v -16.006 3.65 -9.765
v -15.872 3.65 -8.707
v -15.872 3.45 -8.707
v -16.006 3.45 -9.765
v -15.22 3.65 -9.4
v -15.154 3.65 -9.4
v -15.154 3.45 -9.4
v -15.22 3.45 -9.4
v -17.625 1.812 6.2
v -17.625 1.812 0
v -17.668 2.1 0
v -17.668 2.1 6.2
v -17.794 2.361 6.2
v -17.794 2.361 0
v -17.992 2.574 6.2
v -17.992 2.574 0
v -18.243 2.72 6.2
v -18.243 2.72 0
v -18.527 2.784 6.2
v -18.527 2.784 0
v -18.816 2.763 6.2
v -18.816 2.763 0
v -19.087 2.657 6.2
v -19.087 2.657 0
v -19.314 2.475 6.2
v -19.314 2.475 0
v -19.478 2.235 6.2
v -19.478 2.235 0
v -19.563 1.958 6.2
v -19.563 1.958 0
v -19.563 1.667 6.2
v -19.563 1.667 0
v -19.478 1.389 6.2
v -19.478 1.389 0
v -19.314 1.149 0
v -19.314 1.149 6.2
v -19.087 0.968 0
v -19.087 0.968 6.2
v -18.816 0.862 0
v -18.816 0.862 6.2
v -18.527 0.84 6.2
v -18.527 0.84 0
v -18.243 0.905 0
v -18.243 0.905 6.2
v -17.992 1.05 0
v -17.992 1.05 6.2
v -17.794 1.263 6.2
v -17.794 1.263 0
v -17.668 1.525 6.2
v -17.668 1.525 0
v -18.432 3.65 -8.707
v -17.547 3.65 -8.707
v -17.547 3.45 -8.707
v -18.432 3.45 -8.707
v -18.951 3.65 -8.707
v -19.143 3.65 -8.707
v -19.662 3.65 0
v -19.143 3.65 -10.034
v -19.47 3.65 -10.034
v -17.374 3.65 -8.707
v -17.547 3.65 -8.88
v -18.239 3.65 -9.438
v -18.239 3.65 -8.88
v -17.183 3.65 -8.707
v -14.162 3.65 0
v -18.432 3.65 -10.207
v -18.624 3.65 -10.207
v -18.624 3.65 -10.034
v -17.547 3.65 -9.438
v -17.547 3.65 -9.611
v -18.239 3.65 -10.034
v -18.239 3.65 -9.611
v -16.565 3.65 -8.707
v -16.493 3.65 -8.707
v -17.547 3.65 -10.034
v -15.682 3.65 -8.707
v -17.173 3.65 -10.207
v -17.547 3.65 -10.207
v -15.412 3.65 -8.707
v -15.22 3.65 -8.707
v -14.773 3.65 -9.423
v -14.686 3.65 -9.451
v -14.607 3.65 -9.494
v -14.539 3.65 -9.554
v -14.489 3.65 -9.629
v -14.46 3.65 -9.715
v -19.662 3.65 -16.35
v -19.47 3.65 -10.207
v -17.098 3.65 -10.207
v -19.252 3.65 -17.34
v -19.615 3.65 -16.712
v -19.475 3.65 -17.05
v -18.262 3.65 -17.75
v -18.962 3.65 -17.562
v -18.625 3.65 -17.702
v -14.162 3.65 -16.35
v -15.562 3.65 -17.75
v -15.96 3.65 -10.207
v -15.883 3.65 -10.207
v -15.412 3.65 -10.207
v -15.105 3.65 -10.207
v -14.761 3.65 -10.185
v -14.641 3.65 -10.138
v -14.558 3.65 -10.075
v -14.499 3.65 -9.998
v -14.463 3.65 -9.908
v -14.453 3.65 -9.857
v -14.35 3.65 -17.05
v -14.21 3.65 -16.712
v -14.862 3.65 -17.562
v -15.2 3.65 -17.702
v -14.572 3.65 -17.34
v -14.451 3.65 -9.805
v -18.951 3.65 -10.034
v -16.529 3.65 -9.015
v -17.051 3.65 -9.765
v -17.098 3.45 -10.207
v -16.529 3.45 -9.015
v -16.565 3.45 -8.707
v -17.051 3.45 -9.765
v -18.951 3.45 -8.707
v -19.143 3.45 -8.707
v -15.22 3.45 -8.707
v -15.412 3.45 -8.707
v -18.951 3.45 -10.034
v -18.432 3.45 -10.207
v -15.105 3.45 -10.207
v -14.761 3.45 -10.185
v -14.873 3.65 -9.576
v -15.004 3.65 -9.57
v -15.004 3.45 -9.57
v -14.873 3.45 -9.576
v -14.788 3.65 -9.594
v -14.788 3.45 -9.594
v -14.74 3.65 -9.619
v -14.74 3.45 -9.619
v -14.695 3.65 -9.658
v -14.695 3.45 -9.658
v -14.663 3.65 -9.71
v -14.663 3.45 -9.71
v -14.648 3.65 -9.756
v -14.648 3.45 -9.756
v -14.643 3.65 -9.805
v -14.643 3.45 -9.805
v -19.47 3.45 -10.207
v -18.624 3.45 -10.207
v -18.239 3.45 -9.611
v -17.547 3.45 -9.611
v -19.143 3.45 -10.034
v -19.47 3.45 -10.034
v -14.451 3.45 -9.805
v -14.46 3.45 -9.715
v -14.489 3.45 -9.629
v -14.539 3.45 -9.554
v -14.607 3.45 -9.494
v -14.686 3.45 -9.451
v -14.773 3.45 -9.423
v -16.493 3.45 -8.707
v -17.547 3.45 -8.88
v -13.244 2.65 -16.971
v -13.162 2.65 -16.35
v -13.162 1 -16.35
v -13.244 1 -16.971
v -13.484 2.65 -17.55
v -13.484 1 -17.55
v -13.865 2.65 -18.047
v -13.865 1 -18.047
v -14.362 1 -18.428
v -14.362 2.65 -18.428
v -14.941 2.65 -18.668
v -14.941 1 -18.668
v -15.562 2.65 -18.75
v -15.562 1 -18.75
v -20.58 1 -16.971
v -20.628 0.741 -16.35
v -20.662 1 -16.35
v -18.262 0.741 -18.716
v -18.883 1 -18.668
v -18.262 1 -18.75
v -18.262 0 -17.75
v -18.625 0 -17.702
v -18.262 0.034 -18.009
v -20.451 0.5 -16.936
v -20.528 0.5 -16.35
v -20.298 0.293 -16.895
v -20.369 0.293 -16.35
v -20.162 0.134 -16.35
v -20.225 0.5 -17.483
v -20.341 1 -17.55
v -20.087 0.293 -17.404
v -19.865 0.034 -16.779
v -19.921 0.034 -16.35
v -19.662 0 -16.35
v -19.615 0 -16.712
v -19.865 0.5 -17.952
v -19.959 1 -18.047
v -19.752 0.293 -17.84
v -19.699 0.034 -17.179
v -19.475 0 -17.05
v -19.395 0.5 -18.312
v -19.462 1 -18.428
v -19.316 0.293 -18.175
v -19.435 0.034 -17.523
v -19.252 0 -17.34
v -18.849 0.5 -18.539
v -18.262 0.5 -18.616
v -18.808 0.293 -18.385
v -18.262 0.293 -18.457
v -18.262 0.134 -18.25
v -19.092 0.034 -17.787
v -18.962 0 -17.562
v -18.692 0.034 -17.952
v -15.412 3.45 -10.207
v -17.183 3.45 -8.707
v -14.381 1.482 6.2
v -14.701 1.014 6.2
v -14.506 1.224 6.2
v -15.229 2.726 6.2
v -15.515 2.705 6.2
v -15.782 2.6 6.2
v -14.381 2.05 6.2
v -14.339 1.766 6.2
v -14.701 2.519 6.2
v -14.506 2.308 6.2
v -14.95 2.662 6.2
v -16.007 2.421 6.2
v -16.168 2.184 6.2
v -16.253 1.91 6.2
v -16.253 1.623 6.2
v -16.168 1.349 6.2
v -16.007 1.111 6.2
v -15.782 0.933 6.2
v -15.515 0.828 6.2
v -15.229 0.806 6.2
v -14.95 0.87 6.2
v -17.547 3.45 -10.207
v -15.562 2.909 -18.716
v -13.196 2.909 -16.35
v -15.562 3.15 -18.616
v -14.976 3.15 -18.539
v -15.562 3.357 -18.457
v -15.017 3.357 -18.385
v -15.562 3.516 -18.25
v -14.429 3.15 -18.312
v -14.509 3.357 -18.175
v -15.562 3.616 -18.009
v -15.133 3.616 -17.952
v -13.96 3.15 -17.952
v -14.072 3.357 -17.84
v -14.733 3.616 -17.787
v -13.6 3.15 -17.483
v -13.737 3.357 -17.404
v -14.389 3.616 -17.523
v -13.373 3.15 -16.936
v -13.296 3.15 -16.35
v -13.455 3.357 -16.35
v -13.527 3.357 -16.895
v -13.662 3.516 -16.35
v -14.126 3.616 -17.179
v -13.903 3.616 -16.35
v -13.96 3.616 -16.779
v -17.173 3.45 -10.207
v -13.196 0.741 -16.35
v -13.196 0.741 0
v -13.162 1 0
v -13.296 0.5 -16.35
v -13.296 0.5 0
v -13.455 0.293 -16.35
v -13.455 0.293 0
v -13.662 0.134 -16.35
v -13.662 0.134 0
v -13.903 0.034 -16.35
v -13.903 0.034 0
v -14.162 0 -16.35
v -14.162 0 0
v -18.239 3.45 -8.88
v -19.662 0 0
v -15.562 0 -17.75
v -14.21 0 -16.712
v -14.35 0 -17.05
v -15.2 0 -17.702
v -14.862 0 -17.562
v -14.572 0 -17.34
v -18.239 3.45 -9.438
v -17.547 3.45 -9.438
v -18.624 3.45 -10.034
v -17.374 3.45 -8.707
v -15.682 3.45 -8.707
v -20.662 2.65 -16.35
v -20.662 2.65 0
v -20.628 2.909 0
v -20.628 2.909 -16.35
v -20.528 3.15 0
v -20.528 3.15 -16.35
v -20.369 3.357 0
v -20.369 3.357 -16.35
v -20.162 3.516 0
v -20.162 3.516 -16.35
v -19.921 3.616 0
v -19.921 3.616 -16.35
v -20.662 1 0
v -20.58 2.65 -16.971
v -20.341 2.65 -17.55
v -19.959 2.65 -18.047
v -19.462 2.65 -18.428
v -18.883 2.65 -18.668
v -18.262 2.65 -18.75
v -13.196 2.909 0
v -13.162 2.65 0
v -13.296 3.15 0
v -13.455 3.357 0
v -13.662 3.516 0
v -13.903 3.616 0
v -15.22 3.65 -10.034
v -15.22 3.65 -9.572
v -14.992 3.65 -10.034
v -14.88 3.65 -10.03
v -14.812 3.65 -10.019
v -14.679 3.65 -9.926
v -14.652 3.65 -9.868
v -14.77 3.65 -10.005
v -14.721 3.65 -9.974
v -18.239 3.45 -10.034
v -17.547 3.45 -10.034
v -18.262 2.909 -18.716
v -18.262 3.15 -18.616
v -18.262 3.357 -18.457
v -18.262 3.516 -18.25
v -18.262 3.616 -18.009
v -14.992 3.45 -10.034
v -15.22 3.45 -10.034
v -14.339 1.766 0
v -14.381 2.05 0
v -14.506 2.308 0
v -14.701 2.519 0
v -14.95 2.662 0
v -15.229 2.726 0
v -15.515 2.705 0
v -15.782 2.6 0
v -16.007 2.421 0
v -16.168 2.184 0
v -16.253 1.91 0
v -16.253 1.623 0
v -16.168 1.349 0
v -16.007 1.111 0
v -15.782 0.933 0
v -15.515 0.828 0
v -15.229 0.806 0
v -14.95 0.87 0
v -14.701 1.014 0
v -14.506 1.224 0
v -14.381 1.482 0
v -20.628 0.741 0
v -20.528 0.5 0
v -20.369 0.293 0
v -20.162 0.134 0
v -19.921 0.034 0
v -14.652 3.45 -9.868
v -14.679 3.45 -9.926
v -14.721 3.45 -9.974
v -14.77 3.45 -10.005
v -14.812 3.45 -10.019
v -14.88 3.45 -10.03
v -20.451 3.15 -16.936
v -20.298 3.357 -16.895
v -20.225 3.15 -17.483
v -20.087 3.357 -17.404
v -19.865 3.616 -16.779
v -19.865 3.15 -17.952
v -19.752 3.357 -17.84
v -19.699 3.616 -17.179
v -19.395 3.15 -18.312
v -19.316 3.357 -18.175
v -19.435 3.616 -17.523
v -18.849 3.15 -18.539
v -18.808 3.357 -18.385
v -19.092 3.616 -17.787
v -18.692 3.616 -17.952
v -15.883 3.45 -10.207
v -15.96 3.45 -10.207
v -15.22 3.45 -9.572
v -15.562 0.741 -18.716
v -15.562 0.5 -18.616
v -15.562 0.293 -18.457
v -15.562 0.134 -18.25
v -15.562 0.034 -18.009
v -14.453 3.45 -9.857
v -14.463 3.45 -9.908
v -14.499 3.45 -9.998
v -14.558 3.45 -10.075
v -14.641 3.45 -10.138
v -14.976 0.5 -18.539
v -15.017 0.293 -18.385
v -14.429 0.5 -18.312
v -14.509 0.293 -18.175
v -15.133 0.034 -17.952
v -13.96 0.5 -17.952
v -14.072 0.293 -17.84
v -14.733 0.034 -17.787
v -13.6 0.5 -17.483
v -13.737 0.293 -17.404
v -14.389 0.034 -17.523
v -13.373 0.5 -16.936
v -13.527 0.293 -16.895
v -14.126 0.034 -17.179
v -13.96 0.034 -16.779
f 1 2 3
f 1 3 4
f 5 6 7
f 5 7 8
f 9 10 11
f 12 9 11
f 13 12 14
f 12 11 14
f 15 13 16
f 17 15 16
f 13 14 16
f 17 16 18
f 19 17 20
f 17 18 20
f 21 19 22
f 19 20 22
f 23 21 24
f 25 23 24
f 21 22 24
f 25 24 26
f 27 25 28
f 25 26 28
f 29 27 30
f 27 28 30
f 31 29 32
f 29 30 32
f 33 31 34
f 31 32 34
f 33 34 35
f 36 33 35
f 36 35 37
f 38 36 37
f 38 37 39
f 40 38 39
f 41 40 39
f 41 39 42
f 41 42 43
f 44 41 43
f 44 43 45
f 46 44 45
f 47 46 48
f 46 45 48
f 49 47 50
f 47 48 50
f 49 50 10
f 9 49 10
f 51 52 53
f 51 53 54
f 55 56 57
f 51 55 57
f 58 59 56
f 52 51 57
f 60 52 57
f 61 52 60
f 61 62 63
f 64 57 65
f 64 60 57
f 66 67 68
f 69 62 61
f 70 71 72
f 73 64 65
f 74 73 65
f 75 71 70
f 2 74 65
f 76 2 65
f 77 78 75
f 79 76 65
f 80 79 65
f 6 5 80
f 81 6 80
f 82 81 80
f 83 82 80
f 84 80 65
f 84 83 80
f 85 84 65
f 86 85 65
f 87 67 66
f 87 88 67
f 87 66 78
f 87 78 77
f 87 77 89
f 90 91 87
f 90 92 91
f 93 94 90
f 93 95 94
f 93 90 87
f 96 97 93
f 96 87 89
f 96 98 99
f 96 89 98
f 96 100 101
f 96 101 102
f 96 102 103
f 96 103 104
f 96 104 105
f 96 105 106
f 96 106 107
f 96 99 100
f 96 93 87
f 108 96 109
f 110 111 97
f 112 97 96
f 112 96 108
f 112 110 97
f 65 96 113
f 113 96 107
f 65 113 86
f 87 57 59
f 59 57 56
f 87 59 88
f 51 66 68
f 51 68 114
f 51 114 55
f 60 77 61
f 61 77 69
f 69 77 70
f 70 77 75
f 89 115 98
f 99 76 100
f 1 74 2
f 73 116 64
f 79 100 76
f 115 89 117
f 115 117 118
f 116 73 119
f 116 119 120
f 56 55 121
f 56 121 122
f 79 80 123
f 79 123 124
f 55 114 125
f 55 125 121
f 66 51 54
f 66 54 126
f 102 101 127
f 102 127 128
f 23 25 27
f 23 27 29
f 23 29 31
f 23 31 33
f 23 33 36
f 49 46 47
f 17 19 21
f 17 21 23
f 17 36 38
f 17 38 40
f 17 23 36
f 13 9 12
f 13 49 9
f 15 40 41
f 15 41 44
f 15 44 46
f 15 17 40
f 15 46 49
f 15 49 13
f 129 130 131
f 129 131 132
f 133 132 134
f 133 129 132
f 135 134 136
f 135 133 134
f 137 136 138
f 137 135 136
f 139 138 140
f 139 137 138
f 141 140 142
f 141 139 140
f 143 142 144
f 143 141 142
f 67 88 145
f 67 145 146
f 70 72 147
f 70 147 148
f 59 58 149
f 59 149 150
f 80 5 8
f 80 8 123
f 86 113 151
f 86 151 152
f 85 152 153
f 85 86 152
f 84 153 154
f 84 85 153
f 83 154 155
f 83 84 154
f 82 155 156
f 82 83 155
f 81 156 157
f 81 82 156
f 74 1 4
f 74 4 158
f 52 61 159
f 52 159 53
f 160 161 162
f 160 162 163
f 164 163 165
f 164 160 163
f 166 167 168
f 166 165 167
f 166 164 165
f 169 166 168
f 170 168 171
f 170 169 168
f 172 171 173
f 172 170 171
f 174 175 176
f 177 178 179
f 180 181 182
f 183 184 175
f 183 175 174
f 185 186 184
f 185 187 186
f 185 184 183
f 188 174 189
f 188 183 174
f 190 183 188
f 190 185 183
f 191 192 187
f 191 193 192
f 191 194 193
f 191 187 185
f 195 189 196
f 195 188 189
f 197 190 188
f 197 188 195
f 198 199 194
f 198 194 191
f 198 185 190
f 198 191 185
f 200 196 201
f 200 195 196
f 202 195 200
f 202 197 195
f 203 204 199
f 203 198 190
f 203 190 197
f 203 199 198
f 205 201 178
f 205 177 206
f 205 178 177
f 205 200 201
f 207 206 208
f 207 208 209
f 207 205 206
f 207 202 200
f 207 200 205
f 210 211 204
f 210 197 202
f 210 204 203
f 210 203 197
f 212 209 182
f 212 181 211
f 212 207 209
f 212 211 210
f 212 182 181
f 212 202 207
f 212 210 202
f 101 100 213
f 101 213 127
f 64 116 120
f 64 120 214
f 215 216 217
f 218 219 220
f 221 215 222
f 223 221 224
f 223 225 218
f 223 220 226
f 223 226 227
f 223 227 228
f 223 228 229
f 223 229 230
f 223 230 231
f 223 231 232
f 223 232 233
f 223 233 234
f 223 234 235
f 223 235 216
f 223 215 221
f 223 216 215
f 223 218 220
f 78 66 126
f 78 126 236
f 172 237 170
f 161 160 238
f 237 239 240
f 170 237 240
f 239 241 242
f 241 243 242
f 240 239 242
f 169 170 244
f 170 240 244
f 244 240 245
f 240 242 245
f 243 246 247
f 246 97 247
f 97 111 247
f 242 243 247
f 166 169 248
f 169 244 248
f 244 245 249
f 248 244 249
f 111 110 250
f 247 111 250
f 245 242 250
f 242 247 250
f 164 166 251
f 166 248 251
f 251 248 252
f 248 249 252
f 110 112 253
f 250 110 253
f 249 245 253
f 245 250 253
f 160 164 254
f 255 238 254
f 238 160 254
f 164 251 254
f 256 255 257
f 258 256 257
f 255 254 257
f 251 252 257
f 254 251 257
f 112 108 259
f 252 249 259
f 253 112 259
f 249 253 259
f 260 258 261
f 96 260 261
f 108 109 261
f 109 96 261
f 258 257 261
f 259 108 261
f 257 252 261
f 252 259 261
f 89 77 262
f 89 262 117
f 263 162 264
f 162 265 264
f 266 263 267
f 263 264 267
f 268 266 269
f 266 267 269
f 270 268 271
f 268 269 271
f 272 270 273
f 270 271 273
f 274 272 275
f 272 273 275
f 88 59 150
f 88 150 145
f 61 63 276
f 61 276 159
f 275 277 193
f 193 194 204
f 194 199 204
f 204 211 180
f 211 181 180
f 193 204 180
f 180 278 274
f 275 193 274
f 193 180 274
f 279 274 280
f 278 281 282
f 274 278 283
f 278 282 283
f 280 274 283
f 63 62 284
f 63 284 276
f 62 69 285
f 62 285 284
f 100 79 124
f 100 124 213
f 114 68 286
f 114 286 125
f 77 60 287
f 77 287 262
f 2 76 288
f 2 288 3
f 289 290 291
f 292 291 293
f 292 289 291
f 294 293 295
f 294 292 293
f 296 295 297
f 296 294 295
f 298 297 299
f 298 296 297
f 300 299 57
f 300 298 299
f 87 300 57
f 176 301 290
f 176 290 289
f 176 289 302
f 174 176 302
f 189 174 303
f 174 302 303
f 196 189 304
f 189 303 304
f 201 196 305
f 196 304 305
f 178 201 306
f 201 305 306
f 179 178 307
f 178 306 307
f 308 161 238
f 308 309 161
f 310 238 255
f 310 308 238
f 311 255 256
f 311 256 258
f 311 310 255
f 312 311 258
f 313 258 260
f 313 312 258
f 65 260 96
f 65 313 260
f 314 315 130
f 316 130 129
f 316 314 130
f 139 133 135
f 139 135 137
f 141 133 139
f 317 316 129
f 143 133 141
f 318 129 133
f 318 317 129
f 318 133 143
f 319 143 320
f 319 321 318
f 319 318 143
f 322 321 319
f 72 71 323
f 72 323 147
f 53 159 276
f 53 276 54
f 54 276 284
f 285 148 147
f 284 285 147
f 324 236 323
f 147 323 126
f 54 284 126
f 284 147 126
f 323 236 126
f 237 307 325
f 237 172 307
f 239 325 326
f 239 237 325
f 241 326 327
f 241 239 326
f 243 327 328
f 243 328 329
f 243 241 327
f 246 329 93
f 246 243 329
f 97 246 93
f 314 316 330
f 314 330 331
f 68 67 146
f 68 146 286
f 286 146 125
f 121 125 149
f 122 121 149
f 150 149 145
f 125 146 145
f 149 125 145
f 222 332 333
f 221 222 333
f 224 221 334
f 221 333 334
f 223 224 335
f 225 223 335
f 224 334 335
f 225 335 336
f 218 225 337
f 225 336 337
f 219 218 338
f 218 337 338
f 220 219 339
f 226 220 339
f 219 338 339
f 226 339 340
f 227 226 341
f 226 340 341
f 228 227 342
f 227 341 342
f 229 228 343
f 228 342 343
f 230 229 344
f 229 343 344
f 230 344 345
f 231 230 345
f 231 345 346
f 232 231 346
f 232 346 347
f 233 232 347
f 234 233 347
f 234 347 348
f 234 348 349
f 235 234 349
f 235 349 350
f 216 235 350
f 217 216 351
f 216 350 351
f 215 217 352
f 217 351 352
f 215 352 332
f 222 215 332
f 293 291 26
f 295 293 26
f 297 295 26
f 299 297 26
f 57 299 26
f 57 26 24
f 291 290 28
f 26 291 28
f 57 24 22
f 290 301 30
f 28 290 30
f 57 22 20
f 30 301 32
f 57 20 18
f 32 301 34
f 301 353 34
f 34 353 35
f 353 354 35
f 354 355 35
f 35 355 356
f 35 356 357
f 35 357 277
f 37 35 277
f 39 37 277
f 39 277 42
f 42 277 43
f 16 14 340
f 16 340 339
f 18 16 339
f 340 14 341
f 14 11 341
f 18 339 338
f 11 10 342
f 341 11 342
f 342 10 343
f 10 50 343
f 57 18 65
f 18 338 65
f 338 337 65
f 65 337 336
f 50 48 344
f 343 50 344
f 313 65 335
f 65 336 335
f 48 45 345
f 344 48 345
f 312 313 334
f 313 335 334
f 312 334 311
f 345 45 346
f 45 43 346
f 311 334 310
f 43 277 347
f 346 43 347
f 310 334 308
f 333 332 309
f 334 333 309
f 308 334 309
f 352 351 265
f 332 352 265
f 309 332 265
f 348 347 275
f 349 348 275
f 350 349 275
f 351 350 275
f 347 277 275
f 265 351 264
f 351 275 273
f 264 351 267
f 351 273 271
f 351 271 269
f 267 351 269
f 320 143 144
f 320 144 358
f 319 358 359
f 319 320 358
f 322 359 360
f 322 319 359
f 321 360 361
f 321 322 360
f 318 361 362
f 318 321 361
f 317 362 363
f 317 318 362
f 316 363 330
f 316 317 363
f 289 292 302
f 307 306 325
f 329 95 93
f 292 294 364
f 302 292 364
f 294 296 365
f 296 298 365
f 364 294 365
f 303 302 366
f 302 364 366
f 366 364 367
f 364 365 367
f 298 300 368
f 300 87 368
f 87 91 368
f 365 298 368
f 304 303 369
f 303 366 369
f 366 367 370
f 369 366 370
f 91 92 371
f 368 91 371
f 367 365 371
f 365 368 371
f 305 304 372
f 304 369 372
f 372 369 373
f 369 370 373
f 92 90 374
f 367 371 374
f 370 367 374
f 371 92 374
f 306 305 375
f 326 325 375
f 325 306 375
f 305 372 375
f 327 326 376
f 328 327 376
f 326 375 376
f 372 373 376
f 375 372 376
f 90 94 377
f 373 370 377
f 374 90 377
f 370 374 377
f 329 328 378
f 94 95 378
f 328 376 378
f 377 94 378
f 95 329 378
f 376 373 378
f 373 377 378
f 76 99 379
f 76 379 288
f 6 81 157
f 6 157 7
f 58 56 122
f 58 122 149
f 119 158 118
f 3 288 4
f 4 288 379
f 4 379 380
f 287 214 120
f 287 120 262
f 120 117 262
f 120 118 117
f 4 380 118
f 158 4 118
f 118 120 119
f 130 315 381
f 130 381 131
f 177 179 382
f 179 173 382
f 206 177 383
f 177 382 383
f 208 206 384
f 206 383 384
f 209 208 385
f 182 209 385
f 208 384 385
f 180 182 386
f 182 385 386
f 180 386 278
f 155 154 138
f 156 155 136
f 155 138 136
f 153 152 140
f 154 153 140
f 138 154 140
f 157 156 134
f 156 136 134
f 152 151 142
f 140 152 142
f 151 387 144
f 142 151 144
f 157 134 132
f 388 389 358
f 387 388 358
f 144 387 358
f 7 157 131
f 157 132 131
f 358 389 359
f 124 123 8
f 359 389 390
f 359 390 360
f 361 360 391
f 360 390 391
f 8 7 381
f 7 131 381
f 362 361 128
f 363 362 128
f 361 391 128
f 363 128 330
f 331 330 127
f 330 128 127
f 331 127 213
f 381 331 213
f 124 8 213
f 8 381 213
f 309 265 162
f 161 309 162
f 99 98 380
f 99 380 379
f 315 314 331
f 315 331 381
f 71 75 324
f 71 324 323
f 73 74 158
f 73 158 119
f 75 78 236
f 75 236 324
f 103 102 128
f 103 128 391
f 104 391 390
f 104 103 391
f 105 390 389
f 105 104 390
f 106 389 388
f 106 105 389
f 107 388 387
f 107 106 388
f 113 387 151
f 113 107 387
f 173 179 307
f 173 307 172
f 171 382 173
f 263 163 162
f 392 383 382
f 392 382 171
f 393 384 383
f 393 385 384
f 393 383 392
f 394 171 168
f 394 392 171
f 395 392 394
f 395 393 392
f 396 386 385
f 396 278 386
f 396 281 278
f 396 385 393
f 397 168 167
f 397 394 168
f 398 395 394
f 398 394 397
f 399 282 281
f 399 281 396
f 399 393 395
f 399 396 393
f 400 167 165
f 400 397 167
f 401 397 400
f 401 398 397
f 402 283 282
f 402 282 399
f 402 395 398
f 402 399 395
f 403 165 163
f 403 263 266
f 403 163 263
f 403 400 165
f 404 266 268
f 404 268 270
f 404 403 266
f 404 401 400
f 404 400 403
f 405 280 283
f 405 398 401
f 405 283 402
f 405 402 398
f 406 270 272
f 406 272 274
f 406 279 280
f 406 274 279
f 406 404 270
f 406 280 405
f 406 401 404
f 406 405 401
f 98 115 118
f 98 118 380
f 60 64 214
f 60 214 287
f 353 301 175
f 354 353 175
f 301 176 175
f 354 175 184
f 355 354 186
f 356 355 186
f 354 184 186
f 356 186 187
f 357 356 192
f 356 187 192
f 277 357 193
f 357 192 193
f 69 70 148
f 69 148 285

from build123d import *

# Parameters (mm, degrees)
SKETCH1_W           = 7.5
SKETCH1_H           = 18.75
BOSS_EXTRUDE1_DEPTH = 3.65
FILLET1_R           = 2.4
FILLET2_R           = 1
CUT_EXTRUDE1_DEPTH  = 0.2
SKETCH3_R           = 0.974780227
SKETCH3_R_2         = 0.962549202
BOSS_EXTRUDE2_DEPTH = 6.2


with BuildPart() as part:
    # Sketch1 → Boss-Extrude1 (new body)
    with BuildSketch(Plane(origin=(0, 0, 0), x_dir=(1, 0, 0), z_dir=(0, 1, 0))):
        with Locations((-16.912251656, 9.375)):
            Rectangle(SKETCH1_W, SKETCH1_H)
    extrude(amount=BOSS_EXTRUDE1_DEPTH)

    # Fillet1
    fillet1_edges = [part.edges().sort_by_distance(p)[0] for p in [
        (-20.662251656, 1.825, -18.75),
        (-13.162251656, 1.825, -18.75),
    ]]
    fillet(fillet1_edges, radius=FILLET1_R)

    # Fillet2
    fillet2_edges = [part.edges().sort_by_distance(p)[0] for p in [
        (-20.662251656, 0, -8.175),
        (-20.662251656, 3.65, -8.175),
        (-16.912251656, 0, -18.75),
        (-13.865195381, 0, -18.047056275),
        (-19.95930793, 0, -18.047056275),
        (-16.912251656, 3.65, -18.75),
        (-13.865195381, 3.65, -18.047056275),
        (-19.95930793, 3.65, -18.047056275),
        (-13.162251656, 3.65, -8.175),
        (-13.162251656, 0, -8.175),
    ]]
    fillet(fillet2_edges, radius=FILLET2_R)

    # Sketch2 → Cut-Extrude1 (cut)
    with BuildSketch(Plane(origin=(0, 3.65, 0), x_dir=(1, 0, 0), z_dir=(0, 1, 0))):
        Polygon((-19.47000828, 10.03416357), (-19.47000828, 10.207240493), (-18.623854434, 10.207240493), (-18.623854434, 10.03416357), (-18.950777511, 10.03416357), (-18.950777511, 8.707240493), (-19.143085203, 8.707240493), (-19.143085203, 10.03416357), align=None)
        Polygon((-18.431546742, 10.207240493), (-17.546931357, 10.207240493), (-17.546931357, 10.03416357), (-18.239239049, 10.03416357), (-18.239239049, 9.611086647), (-17.546931357, 9.611086647), (-17.546931357, 9.438009724), (-18.239239049, 9.438009724), (-18.239239049, 8.880317416), (-17.546931357, 8.880317416), (-17.546931357, 8.707240493), (-18.431546742, 8.707240493), align=None)
        Polygon((-17.373854434, 8.707240493), (-17.173433761, 10.207240493), (-17.097712607, 10.207240493), (-16.528902511, 9.014932801), (-15.960092415, 10.207240493), (-15.883169338, 10.207240493), (-15.681546742, 8.707240493), (-15.87235203, 8.707240493), (-16.005765492, 9.764932801), (-16.492544338, 8.707240493), (-16.565260684, 8.707240493), (-17.050537126, 9.764932801), (-17.183349626, 8.707240493), align=None)
        with BuildLine():
            Line((-15.412315972, 10.207240493), (-15.104924145, 10.207240493))
            add(Edge.make_bspline(
                [(-15.104924145, 10.207240493), (-15.084590431, 10.207229415), (-15.045621744, 10.207208186), (-14.989736478, 10.205769609), (-14.939035959, 10.204527998), (-14.893445271, 10.202141516), (-14.853068216, 10.198872492), (-14.817890297, 10.195028512), (-14.787873744, 10.190705096), (-14.769771411, 10.186796384), (-14.761474626, 10.185004916)],
                knots=[0, 0, 0, 0, 6.0998e-05, 0.000116901, 0.000167704, 0.00021314, 0.00025384, 0.000289212, 0.000319299, 0.000344757, 0.000344757, 0.000344757, 0.000344757], degree=3))
            add(Edge.make_bspline(
                [(-14.761474626, 10.185004916), (-14.749794935, 10.182001417), (-14.726754486, 10.176076436), (-14.693817305, 10.163863296), (-14.662564371, 10.14998558), (-14.633102385, 10.134199208), (-14.60573229, 10.115966796), (-14.579863591, 10.096157565), (-14.55629197, 10.073769594), (-14.534209882, 10.049888971), (-14.51483493, 10.023970245), (-14.497474918, 9.996890427), (-14.483086108, 9.96825619), (-14.47126094, 9.938174045), (-14.462016779, 9.906800832), (-14.455367321, 9.874036593), (-14.451371733, 9.839953174), (-14.450978032, 9.816726583), (-14.450777511, 9.804896743)],
                knots=[0, 0, 0, 0, 3.6158e-05, 7.1328e-05, 0.000105224, 0.000138702, 0.000171454, 0.00020379, 0.000236316, 0.000268858, 0.00030125, 0.000333261, 0.000365243, 0.000397216, 0.000430113, 0.000463231, 0.000497409, 0.000532886, 0.000532886, 0.000532886, 0.000532886], degree=3))
            add(Edge.make_bspline(
                [(-14.450777511, 9.804896743), (-14.450982431, 9.793067454), (-14.451386495, 9.769742405), (-14.455356851, 9.735455231), (-14.462012335, 9.702622928), (-14.470985169, 9.671100454), (-14.482777462, 9.641083852), (-14.496868277, 9.612319712), (-14.513901371, 9.585133925), (-14.533346655, 9.559337792), (-14.55530593, 9.535327744), (-14.579460944, 9.513194915), (-14.606129209, 9.493325844), (-14.635037209, 9.475363904), (-14.666084216, 9.458994121), (-14.699582563, 9.444914312), (-14.735382799, 9.432916973), (-14.76022897, 9.426537659), (-14.772892895, 9.423286166)],
                knots=[0, 0, 0, 0, 3.5477e-05, 6.9954e-05, 0.000103367, 0.000135891, 0.000168143, 0.000199991, 0.000231842, 0.000264234, 0.000296777, 0.000329319, 0.000362372, 0.000396389, 0.000431334, 0.000467554, 0.000505277, 0.000544492, 0.000544492, 0.000544492, 0.000544492], degree=3))
            add(Edge.make_bspline(
                [(-14.772892895, 9.423286166), (-14.782187231, 9.421271087), (-14.802462631, 9.416875234), (-14.836108437, 9.412301035), (-14.875312671, 9.40855358), (-14.920199238, 9.405293226), (-14.970584149, 9.402554499), (-15.026690891, 9.4009242), (-15.0883915, 9.39960867), (-15.13146575, 9.3995689), (-15.153902511, 9.399548185)],
                knots=[0, 0, 0, 0, 2.8522e-05, 6.222e-05, 0.000101776, 0.00014667, 0.000197223, 0.000253141, 0.000315052, 0.000382361, 0.000382361, 0.000382361, 0.000382361], degree=3))
            Line((-15.153902511, 9.399548185), (-15.22000828, 9.399548185))
            Line((-15.22000828, 9.399548185), (-15.22000828, 8.707240493))
            Line((-15.22000828, 8.707240493), (-15.412315972, 8.707240493))
            Line((-15.412315972, 8.707240493), (-15.412315972, 10.207240493))
        make_face()
        with BuildLine():
            Line((-15.22000828, 10.03416357), (-15.22000828, 9.572024147))
            Line((-15.22000828, 9.572024147), (-15.003662126, 9.569620301))
            add(Edge.make_bspline(
                [(-15.003662126, 9.569620301), (-14.991442118, 9.569781438), (-14.96789801, 9.570091898), (-14.933922023, 9.571169852), (-14.90267133, 9.573360722), (-14.874085566, 9.575915893), (-14.848106984, 9.579498254), (-14.824852537, 9.583969214), (-14.804123942, 9.58899258), (-14.780420498, 9.596890423), (-14.753888196, 9.609222279), (-14.72568146, 9.628038142), (-14.700818195, 9.650540527), (-14.680284887, 9.67702579), (-14.663760532, 9.706207338), (-14.651477561, 9.737397026), (-14.644525179, 9.770537082), (-14.643569262, 9.793147018), (-14.643085203, 9.804596262)],
                knots=[0, 0, 0, 0, 3.6664e-05, 7.0639e-05, 0.00010196, 0.000130633, 0.000156725, 0.000180592, 0.000201654, 0.000220658, 0.000255475, 0.00028906, 0.000322027, 0.000355628, 0.000389134, 0.000422335, 0.000455809, 0.000490148, 0.000490148, 0.000490148, 0.000490148], degree=3))
            add(Edge.make_bspline(
                [(-14.643085203, 9.804596262), (-14.643572758, 9.815645957), (-14.644539806, 9.837562612), (-14.65152853, 9.869796434), (-14.663817169, 9.900371212), (-14.680368439, 9.929142837), (-14.700481342, 9.955440534), (-14.724306032, 9.978063055), (-14.751268987, 9.996551957), (-14.776440979, 10.008393772), (-14.798885683, 10.016100206), (-14.818667462, 10.020627198), (-14.841014829, 10.024859872), (-14.866066555, 10.028488465), (-14.893845944, 10.031105466), (-14.924319512, 10.03278413), (-14.957376784, 10.034099627), (-14.980323278, 10.034141709), (-14.992243857, 10.03416357)],
                knots=[0, 0, 0, 0, 3.314e-05, 6.5732e-05, 9.8374e-05, 0.000131619, 0.000165036, 0.000197343, 0.000229764, 0.000262694, 0.000280463, 0.000300869, 0.000323499, 0.000348698, 0.000376774, 0.000407176, 0.000440251, 0.000476009, 0.000476009, 0.000476009, 0.000476009], degree=3))
            Line((-14.992243857, 10.03416357), (-15.22000828, 10.03416357))
        make_face(mode=Mode.SUBTRACT)
    extrude(amount=-CUT_EXTRUDE1_DEPTH, mode=Mode.SUBTRACT)

    # Sketch3 → Boss-Extrude2 (add)
    with BuildSketch(Plane.XY):
        with Locations((-18.59951473, 1.812377858)):
            Circle(SKETCH3_R)
        with Locations((-15.301212194, 1.766139972)):
            Circle(SKETCH3_R_2)
    extrude(amount=BOSS_EXTRUDE2_DEPTH)


solid = part.part
